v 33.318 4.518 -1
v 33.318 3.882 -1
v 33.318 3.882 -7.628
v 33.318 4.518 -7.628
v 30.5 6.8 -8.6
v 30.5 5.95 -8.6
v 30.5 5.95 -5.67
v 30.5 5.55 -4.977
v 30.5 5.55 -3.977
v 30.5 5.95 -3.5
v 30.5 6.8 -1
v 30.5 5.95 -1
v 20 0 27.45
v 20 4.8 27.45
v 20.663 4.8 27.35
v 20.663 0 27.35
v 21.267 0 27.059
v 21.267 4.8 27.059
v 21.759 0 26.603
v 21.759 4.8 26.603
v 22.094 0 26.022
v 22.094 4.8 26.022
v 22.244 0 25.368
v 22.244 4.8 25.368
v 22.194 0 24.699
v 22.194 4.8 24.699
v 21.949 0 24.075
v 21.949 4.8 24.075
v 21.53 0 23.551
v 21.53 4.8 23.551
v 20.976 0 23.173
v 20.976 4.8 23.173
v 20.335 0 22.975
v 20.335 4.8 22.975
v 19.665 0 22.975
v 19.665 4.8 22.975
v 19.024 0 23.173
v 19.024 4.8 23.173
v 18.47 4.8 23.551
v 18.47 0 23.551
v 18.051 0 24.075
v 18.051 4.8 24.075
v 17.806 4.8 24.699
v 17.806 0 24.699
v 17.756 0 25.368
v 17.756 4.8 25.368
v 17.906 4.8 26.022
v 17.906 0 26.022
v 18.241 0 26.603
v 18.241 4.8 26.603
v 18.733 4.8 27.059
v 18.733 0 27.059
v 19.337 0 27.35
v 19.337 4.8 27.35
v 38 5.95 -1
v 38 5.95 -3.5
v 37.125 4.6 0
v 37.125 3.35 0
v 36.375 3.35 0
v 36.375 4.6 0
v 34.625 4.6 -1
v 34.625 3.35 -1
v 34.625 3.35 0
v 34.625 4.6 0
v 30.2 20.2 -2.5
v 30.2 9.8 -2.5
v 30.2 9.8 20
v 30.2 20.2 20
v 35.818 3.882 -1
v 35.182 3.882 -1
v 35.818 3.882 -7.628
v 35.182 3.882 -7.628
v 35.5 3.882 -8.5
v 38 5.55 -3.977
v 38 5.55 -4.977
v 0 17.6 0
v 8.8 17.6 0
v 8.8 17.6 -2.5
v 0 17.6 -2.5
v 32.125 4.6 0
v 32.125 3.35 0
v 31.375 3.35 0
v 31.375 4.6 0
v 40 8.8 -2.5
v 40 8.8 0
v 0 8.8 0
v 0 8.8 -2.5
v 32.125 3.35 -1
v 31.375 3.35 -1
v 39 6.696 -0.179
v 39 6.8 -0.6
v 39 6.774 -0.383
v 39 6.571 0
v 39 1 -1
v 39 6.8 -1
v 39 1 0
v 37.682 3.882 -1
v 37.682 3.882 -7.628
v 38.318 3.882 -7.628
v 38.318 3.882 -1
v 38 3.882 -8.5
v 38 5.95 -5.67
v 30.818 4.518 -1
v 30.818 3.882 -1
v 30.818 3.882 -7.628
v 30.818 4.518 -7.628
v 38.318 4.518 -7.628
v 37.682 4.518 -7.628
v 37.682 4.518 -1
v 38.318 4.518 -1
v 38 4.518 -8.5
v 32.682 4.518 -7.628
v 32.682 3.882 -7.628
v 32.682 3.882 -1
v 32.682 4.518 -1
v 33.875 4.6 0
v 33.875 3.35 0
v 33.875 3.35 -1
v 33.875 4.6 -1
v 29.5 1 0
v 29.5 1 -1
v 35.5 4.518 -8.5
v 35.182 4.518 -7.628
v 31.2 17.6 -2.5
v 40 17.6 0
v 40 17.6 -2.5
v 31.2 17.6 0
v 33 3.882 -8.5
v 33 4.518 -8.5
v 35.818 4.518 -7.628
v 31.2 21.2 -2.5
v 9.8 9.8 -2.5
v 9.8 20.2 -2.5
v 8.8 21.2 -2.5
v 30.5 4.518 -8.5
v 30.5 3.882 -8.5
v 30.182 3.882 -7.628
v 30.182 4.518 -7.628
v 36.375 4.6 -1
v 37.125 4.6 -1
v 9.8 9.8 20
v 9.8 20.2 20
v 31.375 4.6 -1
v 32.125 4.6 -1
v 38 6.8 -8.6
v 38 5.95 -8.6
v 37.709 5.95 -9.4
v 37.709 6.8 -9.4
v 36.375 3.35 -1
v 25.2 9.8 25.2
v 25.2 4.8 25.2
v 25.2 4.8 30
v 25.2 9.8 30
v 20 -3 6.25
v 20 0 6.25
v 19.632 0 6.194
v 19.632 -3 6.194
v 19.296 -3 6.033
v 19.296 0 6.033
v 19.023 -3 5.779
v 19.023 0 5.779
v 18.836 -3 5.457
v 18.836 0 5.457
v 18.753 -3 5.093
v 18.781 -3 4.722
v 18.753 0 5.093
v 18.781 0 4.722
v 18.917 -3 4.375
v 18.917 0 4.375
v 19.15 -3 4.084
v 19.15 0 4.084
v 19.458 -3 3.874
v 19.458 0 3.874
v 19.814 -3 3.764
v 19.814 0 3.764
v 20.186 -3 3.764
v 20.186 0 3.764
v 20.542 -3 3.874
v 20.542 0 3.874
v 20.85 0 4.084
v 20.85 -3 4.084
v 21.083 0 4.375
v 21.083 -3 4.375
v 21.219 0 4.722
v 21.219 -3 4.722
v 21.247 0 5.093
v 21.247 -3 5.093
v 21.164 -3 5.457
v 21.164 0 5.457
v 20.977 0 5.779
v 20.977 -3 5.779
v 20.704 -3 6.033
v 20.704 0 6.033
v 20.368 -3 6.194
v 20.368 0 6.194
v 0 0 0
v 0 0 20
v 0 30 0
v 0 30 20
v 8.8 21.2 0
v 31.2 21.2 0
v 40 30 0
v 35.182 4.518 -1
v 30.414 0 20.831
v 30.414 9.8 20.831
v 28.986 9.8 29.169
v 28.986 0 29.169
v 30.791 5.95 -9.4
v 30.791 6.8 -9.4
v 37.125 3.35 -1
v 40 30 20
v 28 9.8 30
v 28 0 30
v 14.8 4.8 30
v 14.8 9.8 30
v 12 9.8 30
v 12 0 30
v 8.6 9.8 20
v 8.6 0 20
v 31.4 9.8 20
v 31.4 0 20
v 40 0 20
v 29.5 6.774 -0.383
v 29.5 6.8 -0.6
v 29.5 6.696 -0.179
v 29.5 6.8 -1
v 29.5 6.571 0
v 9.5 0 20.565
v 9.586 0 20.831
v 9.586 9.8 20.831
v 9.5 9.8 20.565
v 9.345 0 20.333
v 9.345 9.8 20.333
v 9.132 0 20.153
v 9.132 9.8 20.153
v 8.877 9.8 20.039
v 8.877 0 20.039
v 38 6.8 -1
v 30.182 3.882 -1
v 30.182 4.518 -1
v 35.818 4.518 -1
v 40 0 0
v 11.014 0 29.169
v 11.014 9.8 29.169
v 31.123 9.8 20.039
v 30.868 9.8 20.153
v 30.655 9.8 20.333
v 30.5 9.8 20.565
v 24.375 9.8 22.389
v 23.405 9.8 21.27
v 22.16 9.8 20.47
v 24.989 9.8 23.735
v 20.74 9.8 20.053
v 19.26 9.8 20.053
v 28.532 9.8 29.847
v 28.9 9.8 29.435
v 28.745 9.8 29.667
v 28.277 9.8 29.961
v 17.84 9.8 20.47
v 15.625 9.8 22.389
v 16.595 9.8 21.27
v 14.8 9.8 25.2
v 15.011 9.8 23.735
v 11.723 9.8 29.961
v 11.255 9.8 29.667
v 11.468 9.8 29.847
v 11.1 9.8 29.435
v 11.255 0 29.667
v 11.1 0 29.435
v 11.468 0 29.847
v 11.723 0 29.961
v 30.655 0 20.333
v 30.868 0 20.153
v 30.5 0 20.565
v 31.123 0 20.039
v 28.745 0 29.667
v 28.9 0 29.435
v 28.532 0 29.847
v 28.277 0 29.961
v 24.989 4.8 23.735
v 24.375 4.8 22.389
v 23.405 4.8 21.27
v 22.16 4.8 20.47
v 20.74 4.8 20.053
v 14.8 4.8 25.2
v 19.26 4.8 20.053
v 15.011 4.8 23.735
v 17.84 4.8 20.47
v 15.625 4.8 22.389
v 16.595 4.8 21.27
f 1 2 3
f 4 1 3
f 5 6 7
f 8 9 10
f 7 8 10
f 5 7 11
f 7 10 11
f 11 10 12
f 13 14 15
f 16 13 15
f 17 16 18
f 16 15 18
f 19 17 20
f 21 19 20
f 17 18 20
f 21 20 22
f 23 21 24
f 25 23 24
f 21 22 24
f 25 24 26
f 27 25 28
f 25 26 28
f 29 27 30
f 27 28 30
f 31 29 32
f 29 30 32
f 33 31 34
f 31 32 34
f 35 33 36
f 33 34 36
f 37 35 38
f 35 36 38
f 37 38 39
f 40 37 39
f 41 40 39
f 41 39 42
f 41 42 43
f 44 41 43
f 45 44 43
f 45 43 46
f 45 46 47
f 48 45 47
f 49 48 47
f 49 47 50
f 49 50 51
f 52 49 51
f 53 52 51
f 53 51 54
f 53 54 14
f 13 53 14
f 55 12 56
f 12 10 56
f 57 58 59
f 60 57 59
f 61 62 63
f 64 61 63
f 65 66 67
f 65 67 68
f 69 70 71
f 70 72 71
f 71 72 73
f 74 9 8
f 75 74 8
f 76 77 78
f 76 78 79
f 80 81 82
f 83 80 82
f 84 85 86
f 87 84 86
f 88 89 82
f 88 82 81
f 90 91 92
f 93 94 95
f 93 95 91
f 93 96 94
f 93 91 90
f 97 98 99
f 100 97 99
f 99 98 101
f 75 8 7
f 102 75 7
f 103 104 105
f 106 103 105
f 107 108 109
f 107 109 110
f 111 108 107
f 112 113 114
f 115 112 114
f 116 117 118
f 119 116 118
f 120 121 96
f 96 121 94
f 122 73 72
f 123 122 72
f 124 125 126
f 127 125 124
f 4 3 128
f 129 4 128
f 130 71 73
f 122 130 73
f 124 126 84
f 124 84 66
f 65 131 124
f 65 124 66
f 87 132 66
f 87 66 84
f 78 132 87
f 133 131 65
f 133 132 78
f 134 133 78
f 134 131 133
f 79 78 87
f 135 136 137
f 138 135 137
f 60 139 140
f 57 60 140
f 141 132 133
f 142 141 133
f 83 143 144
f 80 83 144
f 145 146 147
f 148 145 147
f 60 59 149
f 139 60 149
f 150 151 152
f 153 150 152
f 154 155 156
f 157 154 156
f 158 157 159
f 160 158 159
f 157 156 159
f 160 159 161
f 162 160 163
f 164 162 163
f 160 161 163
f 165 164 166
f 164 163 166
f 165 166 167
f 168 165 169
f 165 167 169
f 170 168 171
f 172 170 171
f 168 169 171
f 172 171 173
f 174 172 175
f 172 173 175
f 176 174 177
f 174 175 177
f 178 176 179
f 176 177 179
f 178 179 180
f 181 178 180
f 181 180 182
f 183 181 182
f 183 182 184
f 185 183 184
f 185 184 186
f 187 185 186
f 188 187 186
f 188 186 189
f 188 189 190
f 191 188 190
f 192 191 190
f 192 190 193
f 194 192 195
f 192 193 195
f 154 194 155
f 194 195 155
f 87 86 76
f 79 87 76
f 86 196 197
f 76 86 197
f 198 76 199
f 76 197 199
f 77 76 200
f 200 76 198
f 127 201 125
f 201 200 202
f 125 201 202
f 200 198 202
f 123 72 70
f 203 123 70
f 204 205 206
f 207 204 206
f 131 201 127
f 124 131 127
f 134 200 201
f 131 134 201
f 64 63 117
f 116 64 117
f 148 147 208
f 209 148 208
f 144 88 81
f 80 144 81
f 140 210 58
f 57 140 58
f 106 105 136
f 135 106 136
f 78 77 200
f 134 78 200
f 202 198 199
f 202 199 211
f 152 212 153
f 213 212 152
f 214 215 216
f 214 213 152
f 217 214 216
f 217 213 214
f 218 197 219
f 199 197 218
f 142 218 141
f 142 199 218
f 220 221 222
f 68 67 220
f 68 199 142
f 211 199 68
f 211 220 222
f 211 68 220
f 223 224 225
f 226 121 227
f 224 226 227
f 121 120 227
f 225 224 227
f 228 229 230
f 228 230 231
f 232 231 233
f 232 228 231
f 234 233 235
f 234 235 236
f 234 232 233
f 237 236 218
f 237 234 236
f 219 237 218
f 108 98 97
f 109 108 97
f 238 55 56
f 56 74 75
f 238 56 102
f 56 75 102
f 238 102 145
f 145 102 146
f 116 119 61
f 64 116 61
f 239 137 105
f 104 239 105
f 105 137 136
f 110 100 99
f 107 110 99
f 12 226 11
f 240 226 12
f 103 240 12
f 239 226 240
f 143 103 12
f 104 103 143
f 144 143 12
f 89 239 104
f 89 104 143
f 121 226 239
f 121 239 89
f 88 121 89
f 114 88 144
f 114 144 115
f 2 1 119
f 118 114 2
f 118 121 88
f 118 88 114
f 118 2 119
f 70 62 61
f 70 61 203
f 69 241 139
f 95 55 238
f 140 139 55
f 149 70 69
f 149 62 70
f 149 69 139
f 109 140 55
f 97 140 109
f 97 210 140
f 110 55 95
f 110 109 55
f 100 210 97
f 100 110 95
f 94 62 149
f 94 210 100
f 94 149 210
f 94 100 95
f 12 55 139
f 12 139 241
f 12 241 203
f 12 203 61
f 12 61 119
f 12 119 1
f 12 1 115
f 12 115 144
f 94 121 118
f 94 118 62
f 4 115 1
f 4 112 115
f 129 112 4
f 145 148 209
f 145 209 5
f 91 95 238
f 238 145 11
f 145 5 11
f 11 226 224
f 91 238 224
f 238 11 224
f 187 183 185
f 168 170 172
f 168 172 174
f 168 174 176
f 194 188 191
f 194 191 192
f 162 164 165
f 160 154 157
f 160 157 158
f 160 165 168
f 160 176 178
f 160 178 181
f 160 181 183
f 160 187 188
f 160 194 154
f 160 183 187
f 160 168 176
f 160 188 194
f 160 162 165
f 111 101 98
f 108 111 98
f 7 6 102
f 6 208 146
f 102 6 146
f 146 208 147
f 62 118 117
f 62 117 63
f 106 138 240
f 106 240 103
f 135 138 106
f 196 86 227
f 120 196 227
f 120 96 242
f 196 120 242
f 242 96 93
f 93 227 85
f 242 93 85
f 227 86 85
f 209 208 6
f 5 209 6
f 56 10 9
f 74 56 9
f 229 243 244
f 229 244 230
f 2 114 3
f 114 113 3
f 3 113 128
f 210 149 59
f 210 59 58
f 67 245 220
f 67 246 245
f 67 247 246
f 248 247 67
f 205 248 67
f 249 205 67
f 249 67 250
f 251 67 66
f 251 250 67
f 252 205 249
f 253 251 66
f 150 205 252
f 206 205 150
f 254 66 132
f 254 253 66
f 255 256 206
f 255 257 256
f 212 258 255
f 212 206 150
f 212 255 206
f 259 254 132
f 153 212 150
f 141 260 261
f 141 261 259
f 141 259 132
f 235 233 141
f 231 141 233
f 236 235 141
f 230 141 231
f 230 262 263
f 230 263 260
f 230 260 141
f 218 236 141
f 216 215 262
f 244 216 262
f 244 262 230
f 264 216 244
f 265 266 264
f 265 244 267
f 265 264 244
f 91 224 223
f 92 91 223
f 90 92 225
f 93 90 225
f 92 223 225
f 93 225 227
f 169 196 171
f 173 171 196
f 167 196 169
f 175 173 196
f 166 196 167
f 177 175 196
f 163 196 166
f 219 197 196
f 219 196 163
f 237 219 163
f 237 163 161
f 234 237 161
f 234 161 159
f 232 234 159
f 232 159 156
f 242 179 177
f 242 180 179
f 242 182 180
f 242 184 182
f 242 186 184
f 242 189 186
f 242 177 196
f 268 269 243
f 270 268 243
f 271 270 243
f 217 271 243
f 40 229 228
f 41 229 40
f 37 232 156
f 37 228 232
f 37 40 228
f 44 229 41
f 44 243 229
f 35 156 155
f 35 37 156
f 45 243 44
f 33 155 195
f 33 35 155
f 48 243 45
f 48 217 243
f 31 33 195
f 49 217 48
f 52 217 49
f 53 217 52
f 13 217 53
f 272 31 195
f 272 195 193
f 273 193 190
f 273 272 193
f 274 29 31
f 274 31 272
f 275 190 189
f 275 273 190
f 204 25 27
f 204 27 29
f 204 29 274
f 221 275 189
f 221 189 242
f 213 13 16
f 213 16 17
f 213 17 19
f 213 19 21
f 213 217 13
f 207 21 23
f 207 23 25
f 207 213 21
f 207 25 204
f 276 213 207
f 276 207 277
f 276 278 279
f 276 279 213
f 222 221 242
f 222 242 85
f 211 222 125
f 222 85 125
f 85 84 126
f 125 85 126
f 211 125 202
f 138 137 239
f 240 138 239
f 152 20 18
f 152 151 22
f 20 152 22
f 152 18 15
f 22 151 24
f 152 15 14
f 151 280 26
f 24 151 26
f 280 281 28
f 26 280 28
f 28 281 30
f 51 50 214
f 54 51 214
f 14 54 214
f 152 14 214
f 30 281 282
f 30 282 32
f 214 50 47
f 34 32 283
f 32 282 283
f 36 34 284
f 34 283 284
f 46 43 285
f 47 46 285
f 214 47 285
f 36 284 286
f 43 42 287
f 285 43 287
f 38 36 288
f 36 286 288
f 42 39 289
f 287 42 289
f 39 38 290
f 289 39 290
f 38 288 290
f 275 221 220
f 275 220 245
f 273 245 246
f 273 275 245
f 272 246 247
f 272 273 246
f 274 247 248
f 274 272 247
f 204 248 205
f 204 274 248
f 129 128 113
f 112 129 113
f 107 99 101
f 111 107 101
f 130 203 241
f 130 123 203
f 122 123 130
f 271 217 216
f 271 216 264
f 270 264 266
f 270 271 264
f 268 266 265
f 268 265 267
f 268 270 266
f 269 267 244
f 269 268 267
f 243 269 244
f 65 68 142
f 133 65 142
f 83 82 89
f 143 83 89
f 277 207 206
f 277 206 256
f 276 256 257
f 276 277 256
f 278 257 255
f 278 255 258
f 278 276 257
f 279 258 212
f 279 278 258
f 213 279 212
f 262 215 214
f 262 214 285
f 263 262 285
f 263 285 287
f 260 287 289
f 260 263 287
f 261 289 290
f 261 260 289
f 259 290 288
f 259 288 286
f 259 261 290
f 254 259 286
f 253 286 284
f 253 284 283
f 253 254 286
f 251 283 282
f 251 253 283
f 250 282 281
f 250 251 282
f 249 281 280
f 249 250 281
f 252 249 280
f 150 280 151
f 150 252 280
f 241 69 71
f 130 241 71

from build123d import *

# Parameters (mm, degrees)
SKETCH1_W                   = 40
SKETCH1_H                   = 30
SKETCH1_W_2                 = 20.4
SKETCH1_H_2                 = 10.4
BOSS_EXTRUDE1_DEPTH         = 20
BOSS_EXTRUDE2_DEPTH         = 9.8
CUT_EXTRUDE1_DEPTH          = 5
SKETCH4_R                   = 2.25
CUT_EXTRUDE2_DEPTH          = 56.991427915
SKETCH5_W                   = 8.8
SKETCH5_H                   = 8.8
SKETCH5_W_2                 = 20.4
SKETCH5_H_2                 = 10.4
BOSS_EXTRUDE3_DEPTH         = 2.5
SKETCH7_R                   = 1.25
BOSS_EXTRUDE4_DEPTH         = 3
BODY_MOVE_COPY6_START       = 1
BODY_MOVE_COPY6_DEPTH       = 4.9
BODY_MOVE_COPY6_START_2     = 5.95
BODY_MOVE_COPY6_2_DEPTH     = 0.85
BODY_MOVE_COPY6_START_3     = 3.8825
BODY_MOVE_COPY6_3_DEPTH     = 0.635
BODY_MOVE_COPY6_4_OUTLINE_W = 0.75
BODY_MOVE_COPY6_4_OUTLINE_H = 1
BODY_MOVE_COPY6_4_DEPTH     = 2.35
BODY_MOVE_COPY6_START_4     = 4.6
BODY_MOVE_COPY6_5_OUTLINE_W = 0.75
BODY_MOVE_COPY6_5_OUTLINE_H = 1
BODY_MOVE_COPY6_5_DEPTH     = 1.35
BODY_MOVE_COPY6_START_5     = 30.5
BODY_MOVE_COPY6_6_DEPTH     = 7.5
BODY_MOVE_COPY6_START_6     = 29.5
BODY_MOVE_COPY6_7_DEPTH     = 9.5


with BuildPart() as part:
    # Sketch1 → Boss-Extrude1 (new body)
    with BuildSketch(Plane.XY):
        with Locations((20, 15)):
            Rectangle(SKETCH1_W, SKETCH1_H)
        with Locations((20, 15)):
            Rectangle(SKETCH1_W_2, SKETCH1_H_2, mode=Mode.SUBTRACT)
    extrude(amount=BOSS_EXTRUDE1_DEPTH)

    # Sketch2 → Boss-Extrude2 (add)
    with BuildSketch(Plane.XZ):
        with BuildLine():
            Line((8.6, 20), (31.4, 20))
            ThreePointArc((31.4, 20), (30.755366169, 20.23550851), (30.414365834, 20.831105526))
            Line((30.414365834, 20.831105526), (28.985634166, 29.168894474))
            ThreePointArc((28.985634166, 29.168894474), (28.644633831, 29.76449149), (28, 30))
            Line((28, 30), (12, 30))
            ThreePointArc((12, 30), (11.355366169, 29.76449149), (11.014365834, 29.168894474))
            Line((11.014365834, 29.168894474), (9.585634166, 20.831105526))
            ThreePointArc((9.585634166, 20.831105526), (9.244633831, 20.23550851), (8.6, 20))
        make_face()
    extrude(amount=-BOSS_EXTRUDE2_DEPTH)

    # Sketch3 → Cut-Extrude1 (cut)
    with BuildSketch(Plane(origin=(0, 9.8, 0), x_dir=(1, 0, 0), z_dir=(0, 1, 0))):
        with BuildLine():
            Line((25.2, -25.2), (25.2, -30))
            Line((25.2, -30), (14.8, -30))
            Line((14.8, -30), (14.8, -25.2))
            ThreePointArc((14.8, -25.2), (20, -20), (25.2, -25.2))
        make_face()
    extrude(amount=-CUT_EXTRUDE1_DEPTH, mode=Mode.SUBTRACT)

    # Sketch4 → Cut-Extrude2 (cut, through all)
    with BuildSketch(Plane(origin=(0, 4.8, 0), x_dir=(1, 0, 0), z_dir=(0, 1, 0))):
        with Locations(Location((20, -25.2, 0), (0, 0, 270))):
            Circle(SKETCH4_R)
    extrude(amount=-CUT_EXTRUDE2_DEPTH, mode=Mode.SUBTRACT)

    # Sketch5 → Boss-Extrude3 (add)
    # profile 1 of 3: a face of its own
    with BuildSketch(Plane(origin=(0, 0, 0), x_dir=(-1, 0, 0), z_dir=(0, 0, -1))):
        with Locations((-4.4, 13.2)):
            Rectangle(SKETCH5_W, SKETCH5_H)
    # profile 2 of 3: a face of its own
    with BuildSketch(Plane(origin=(0, 0, 0), x_dir=(-1, 0, 0), z_dir=(0, 0, -1))):
        Polygon((-31.2, 8.8), (-8.8, 8.8), (-8.8, 17.6), (-8.8, 21.2), (-31.2, 21.2), (-31.2, 17.6), align=None)
        with Locations((-20, 15)):
            Rectangle(SKETCH5_W_2, SKETCH5_H_2, mode=Mode.SUBTRACT)
    # profile 3 of 3: a face of its own
    with BuildSketch(Plane(origin=(0, 0, 0), x_dir=(-1, 0, 0), z_dir=(0, 0, -1))):
        with Locations((-35.6, 13.2)):
            Rectangle(SKETCH5_W, SKETCH5_H)
    extrude(amount=BOSS_EXTRUDE3_DEPTH)

    # Sketch7 → Boss-Extrude4 (add)
    with BuildSketch(Plane.XZ):
        with Locations(Location((20, 5, 0), (0, 0, 90))):
            Circle(SKETCH7_R)
    extrude(amount=BOSS_EXTRUDE4_DEPTH)


with BuildPart() as body_2:
    # Body-Move/Copy6: read off the stored shape, not the designer's step
    # Body-Move/Copy6 outline → Body-Move/Copy6 (new body)
    with BuildSketch(Plane(origin=(0, 0, 0), x_dir=(1, 0, 0), z_dir=(0, 1, 0)).offset(BODY_MOVE_COPY6_START)):
        Polygon((34.75, -1.3), (36.25, -1.3), (36.25, -2.3), (37.25, -2.3), (37.25, -1.3), (38.75, -1.3), (38.75, -2.3), (39, -2.3), (39, 1), (37.125, 1), (37.125, 0), (36.375, 0), (36.375, 1), (34.625, 1), (34.625, 0), (33.875, 0), (33.875, 1), (32.125, 1), (32.125, 0), (31.375, 0), (31.375, 1), (29.5, 1), (29.5, -2.3), (29.75, -2.3), (29.75, -1.3), (31.25, -1.3), (31.25, -2.3), (32.25, -2.3), (32.25, -1.3), (33.75, -1.3), (33.75, -2.3), (34.75, -2.3), align=None)
    extrude(amount=BODY_MOVE_COPY6_DEPTH)

    # Body-Move_Copy6 2 outline → Body-Move_Copy6 2 (add)
    with BuildSketch(Plane(origin=(0, 0, 0), x_dir=(1, 0, 0), z_dir=(0, 1, 0)).offset(BODY_MOVE_COPY6_START_2)):
        Polygon((38, 1), (38, 8.6), (37.708823813, 9.4), (30.791176187, 9.4), (30.5, 8.6), (30.5, 1), align=None)
    extrude(amount=BODY_MOVE_COPY6_2_DEPTH)

    # Body-Move_Copy6 3 outline → Body-Move_Copy6 3 (add)
    with BuildSketch(Plane(origin=(0, 0, 0), x_dir=(1, 0, 0), z_dir=(0, 1, 0)).offset(BODY_MOVE_COPY6_START_3)):
        Polygon((35.1825, -4.827675919), (35.5, -5.7), (35.8175, -4.827675919), (35.8175, -1.3), (35.1825, -1.3), align=None)
        Polygon((38.3175, -1.3), (37.6825, -1.3), (37.6825, -4.827675919), (38, -5.7), (38.3175, -4.827675919), align=None)
        Polygon((33.3175, -4.827675919), (33.3175, -1.3), (32.6825, -1.3), (32.6825, -4.827675919), (33, -5.7), align=None)
        Polygon((38.3175, 1), (38.3175, 7.627675919), (38, 8.5), (37.6825, 7.627675919), (37.6825, 1), align=None)
        Polygon((30.8175, -4.827675919), (30.8175, -1.3), (30.1825, -1.3), (30.1825, -4.827675919), (30.5, -5.7), align=None)
        Polygon((35.1825, 1), (35.8175, 1), (35.8175, 7.627675919), (35.5, 8.5), (35.1825, 7.627675919), align=None)
        Polygon((30.1825, 7.627675919), (30.1825, 1), (30.8175, 1), (30.8175, 7.627675919), (30.5, 8.5), align=None)
        Polygon((32.6825, 1), (33.3175, 1), (33.3175, 7.627675919), (33, 8.5), (32.6825, 7.627675919), align=None)
    extrude(amount=BODY_MOVE_COPY6_3_DEPTH)

    # Body-Move_Copy6 4 outline → Body-Move_Copy6 4 (add)
    with BuildSketch(Plane(origin=(0, 0, 0), x_dir=(1, 0, 0), z_dir=(0, 1, 0)).offset(BODY_MOVE_COPY6_START)):
        with Locations((36.75, 0.5)):
            Rectangle(BODY_MOVE_COPY6_4_OUTLINE_W, BODY_MOVE_COPY6_4_OUTLINE_H)
        with Locations((34.25, 0.5)):
            Rectangle(BODY_MOVE_COPY6_4_OUTLINE_W, BODY_MOVE_COPY6_4_OUTLINE_H)
        with Locations((31.75, 0.5)):
            Rectangle(BODY_MOVE_COPY6_4_OUTLINE_W, BODY_MOVE_COPY6_4_OUTLINE_H)
    extrude(amount=BODY_MOVE_COPY6_4_DEPTH)

    # Body-Move_Copy6 5 outline → Body-Move_Copy6 5 (add)
    with BuildSketch(Plane(origin=(0, 0, 0), x_dir=(1, 0, 0), z_dir=(0, 1, 0)).offset(BODY_MOVE_COPY6_START_4)):
        with Locations((36.75, 0.5)):
            Rectangle(BODY_MOVE_COPY6_5_OUTLINE_W, BODY_MOVE_COPY6_5_OUTLINE_H)
        with Locations((34.25, 0.5)):
            Rectangle(BODY_MOVE_COPY6_5_OUTLINE_W, BODY_MOVE_COPY6_5_OUTLINE_H)
        with Locations((31.75, 0.5)):
            Rectangle(BODY_MOVE_COPY6_5_OUTLINE_W, BODY_MOVE_COPY6_5_OUTLINE_H)
    extrude(amount=BODY_MOVE_COPY6_5_DEPTH)

    # Body-Move_Copy6 6 outline → Body-Move_Copy6 6 (add)
    with BuildSketch(Plane.YZ.offset(BODY_MOVE_COPY6_START_5)):
        Polygon((5.95, -3.5), (5.55, -3.976701437), (5.55, -4.976701437), (5.95, -5.66952176), align=None)
        with BuildLine():
            Line((5.9, -1), (6.8, -1))
            Line((6.8, -1), (6.8, -0.6))
            ThreePointArc((6.8, -0.6), (6.536396103, 0.036396103), (5.9, 0.3))
            Line((5.9, 0.3), (5.9, -1))
        make_face()
    extrude(amount=BODY_MOVE_COPY6_6_DEPTH)

    # Body-Move_Copy6 7 outline → Body-Move_Copy6 7 (add)
    with BuildSketch(Plane.YZ.offset(BODY_MOVE_COPY6_START_6)):
        with BuildLine():
            Line((5.9, -1), (6.8, -1))
            Line((6.8, -1), (6.8, -0.6))
            ThreePointArc((6.8, -0.6), (6.536396103, 0.036396103), (5.9, 0.3))
            Line((5.9, 0.3), (5.9, -1))
        make_face()
    extrude(amount=BODY_MOVE_COPY6_7_DEPTH)


with BuildPart() as part_1:
    add(part.part)

    # Intersect3: read off the stored shape, not the designer's step
    # Intersect3: union body 2
    add(body_2.part)


solid = part_1.part
